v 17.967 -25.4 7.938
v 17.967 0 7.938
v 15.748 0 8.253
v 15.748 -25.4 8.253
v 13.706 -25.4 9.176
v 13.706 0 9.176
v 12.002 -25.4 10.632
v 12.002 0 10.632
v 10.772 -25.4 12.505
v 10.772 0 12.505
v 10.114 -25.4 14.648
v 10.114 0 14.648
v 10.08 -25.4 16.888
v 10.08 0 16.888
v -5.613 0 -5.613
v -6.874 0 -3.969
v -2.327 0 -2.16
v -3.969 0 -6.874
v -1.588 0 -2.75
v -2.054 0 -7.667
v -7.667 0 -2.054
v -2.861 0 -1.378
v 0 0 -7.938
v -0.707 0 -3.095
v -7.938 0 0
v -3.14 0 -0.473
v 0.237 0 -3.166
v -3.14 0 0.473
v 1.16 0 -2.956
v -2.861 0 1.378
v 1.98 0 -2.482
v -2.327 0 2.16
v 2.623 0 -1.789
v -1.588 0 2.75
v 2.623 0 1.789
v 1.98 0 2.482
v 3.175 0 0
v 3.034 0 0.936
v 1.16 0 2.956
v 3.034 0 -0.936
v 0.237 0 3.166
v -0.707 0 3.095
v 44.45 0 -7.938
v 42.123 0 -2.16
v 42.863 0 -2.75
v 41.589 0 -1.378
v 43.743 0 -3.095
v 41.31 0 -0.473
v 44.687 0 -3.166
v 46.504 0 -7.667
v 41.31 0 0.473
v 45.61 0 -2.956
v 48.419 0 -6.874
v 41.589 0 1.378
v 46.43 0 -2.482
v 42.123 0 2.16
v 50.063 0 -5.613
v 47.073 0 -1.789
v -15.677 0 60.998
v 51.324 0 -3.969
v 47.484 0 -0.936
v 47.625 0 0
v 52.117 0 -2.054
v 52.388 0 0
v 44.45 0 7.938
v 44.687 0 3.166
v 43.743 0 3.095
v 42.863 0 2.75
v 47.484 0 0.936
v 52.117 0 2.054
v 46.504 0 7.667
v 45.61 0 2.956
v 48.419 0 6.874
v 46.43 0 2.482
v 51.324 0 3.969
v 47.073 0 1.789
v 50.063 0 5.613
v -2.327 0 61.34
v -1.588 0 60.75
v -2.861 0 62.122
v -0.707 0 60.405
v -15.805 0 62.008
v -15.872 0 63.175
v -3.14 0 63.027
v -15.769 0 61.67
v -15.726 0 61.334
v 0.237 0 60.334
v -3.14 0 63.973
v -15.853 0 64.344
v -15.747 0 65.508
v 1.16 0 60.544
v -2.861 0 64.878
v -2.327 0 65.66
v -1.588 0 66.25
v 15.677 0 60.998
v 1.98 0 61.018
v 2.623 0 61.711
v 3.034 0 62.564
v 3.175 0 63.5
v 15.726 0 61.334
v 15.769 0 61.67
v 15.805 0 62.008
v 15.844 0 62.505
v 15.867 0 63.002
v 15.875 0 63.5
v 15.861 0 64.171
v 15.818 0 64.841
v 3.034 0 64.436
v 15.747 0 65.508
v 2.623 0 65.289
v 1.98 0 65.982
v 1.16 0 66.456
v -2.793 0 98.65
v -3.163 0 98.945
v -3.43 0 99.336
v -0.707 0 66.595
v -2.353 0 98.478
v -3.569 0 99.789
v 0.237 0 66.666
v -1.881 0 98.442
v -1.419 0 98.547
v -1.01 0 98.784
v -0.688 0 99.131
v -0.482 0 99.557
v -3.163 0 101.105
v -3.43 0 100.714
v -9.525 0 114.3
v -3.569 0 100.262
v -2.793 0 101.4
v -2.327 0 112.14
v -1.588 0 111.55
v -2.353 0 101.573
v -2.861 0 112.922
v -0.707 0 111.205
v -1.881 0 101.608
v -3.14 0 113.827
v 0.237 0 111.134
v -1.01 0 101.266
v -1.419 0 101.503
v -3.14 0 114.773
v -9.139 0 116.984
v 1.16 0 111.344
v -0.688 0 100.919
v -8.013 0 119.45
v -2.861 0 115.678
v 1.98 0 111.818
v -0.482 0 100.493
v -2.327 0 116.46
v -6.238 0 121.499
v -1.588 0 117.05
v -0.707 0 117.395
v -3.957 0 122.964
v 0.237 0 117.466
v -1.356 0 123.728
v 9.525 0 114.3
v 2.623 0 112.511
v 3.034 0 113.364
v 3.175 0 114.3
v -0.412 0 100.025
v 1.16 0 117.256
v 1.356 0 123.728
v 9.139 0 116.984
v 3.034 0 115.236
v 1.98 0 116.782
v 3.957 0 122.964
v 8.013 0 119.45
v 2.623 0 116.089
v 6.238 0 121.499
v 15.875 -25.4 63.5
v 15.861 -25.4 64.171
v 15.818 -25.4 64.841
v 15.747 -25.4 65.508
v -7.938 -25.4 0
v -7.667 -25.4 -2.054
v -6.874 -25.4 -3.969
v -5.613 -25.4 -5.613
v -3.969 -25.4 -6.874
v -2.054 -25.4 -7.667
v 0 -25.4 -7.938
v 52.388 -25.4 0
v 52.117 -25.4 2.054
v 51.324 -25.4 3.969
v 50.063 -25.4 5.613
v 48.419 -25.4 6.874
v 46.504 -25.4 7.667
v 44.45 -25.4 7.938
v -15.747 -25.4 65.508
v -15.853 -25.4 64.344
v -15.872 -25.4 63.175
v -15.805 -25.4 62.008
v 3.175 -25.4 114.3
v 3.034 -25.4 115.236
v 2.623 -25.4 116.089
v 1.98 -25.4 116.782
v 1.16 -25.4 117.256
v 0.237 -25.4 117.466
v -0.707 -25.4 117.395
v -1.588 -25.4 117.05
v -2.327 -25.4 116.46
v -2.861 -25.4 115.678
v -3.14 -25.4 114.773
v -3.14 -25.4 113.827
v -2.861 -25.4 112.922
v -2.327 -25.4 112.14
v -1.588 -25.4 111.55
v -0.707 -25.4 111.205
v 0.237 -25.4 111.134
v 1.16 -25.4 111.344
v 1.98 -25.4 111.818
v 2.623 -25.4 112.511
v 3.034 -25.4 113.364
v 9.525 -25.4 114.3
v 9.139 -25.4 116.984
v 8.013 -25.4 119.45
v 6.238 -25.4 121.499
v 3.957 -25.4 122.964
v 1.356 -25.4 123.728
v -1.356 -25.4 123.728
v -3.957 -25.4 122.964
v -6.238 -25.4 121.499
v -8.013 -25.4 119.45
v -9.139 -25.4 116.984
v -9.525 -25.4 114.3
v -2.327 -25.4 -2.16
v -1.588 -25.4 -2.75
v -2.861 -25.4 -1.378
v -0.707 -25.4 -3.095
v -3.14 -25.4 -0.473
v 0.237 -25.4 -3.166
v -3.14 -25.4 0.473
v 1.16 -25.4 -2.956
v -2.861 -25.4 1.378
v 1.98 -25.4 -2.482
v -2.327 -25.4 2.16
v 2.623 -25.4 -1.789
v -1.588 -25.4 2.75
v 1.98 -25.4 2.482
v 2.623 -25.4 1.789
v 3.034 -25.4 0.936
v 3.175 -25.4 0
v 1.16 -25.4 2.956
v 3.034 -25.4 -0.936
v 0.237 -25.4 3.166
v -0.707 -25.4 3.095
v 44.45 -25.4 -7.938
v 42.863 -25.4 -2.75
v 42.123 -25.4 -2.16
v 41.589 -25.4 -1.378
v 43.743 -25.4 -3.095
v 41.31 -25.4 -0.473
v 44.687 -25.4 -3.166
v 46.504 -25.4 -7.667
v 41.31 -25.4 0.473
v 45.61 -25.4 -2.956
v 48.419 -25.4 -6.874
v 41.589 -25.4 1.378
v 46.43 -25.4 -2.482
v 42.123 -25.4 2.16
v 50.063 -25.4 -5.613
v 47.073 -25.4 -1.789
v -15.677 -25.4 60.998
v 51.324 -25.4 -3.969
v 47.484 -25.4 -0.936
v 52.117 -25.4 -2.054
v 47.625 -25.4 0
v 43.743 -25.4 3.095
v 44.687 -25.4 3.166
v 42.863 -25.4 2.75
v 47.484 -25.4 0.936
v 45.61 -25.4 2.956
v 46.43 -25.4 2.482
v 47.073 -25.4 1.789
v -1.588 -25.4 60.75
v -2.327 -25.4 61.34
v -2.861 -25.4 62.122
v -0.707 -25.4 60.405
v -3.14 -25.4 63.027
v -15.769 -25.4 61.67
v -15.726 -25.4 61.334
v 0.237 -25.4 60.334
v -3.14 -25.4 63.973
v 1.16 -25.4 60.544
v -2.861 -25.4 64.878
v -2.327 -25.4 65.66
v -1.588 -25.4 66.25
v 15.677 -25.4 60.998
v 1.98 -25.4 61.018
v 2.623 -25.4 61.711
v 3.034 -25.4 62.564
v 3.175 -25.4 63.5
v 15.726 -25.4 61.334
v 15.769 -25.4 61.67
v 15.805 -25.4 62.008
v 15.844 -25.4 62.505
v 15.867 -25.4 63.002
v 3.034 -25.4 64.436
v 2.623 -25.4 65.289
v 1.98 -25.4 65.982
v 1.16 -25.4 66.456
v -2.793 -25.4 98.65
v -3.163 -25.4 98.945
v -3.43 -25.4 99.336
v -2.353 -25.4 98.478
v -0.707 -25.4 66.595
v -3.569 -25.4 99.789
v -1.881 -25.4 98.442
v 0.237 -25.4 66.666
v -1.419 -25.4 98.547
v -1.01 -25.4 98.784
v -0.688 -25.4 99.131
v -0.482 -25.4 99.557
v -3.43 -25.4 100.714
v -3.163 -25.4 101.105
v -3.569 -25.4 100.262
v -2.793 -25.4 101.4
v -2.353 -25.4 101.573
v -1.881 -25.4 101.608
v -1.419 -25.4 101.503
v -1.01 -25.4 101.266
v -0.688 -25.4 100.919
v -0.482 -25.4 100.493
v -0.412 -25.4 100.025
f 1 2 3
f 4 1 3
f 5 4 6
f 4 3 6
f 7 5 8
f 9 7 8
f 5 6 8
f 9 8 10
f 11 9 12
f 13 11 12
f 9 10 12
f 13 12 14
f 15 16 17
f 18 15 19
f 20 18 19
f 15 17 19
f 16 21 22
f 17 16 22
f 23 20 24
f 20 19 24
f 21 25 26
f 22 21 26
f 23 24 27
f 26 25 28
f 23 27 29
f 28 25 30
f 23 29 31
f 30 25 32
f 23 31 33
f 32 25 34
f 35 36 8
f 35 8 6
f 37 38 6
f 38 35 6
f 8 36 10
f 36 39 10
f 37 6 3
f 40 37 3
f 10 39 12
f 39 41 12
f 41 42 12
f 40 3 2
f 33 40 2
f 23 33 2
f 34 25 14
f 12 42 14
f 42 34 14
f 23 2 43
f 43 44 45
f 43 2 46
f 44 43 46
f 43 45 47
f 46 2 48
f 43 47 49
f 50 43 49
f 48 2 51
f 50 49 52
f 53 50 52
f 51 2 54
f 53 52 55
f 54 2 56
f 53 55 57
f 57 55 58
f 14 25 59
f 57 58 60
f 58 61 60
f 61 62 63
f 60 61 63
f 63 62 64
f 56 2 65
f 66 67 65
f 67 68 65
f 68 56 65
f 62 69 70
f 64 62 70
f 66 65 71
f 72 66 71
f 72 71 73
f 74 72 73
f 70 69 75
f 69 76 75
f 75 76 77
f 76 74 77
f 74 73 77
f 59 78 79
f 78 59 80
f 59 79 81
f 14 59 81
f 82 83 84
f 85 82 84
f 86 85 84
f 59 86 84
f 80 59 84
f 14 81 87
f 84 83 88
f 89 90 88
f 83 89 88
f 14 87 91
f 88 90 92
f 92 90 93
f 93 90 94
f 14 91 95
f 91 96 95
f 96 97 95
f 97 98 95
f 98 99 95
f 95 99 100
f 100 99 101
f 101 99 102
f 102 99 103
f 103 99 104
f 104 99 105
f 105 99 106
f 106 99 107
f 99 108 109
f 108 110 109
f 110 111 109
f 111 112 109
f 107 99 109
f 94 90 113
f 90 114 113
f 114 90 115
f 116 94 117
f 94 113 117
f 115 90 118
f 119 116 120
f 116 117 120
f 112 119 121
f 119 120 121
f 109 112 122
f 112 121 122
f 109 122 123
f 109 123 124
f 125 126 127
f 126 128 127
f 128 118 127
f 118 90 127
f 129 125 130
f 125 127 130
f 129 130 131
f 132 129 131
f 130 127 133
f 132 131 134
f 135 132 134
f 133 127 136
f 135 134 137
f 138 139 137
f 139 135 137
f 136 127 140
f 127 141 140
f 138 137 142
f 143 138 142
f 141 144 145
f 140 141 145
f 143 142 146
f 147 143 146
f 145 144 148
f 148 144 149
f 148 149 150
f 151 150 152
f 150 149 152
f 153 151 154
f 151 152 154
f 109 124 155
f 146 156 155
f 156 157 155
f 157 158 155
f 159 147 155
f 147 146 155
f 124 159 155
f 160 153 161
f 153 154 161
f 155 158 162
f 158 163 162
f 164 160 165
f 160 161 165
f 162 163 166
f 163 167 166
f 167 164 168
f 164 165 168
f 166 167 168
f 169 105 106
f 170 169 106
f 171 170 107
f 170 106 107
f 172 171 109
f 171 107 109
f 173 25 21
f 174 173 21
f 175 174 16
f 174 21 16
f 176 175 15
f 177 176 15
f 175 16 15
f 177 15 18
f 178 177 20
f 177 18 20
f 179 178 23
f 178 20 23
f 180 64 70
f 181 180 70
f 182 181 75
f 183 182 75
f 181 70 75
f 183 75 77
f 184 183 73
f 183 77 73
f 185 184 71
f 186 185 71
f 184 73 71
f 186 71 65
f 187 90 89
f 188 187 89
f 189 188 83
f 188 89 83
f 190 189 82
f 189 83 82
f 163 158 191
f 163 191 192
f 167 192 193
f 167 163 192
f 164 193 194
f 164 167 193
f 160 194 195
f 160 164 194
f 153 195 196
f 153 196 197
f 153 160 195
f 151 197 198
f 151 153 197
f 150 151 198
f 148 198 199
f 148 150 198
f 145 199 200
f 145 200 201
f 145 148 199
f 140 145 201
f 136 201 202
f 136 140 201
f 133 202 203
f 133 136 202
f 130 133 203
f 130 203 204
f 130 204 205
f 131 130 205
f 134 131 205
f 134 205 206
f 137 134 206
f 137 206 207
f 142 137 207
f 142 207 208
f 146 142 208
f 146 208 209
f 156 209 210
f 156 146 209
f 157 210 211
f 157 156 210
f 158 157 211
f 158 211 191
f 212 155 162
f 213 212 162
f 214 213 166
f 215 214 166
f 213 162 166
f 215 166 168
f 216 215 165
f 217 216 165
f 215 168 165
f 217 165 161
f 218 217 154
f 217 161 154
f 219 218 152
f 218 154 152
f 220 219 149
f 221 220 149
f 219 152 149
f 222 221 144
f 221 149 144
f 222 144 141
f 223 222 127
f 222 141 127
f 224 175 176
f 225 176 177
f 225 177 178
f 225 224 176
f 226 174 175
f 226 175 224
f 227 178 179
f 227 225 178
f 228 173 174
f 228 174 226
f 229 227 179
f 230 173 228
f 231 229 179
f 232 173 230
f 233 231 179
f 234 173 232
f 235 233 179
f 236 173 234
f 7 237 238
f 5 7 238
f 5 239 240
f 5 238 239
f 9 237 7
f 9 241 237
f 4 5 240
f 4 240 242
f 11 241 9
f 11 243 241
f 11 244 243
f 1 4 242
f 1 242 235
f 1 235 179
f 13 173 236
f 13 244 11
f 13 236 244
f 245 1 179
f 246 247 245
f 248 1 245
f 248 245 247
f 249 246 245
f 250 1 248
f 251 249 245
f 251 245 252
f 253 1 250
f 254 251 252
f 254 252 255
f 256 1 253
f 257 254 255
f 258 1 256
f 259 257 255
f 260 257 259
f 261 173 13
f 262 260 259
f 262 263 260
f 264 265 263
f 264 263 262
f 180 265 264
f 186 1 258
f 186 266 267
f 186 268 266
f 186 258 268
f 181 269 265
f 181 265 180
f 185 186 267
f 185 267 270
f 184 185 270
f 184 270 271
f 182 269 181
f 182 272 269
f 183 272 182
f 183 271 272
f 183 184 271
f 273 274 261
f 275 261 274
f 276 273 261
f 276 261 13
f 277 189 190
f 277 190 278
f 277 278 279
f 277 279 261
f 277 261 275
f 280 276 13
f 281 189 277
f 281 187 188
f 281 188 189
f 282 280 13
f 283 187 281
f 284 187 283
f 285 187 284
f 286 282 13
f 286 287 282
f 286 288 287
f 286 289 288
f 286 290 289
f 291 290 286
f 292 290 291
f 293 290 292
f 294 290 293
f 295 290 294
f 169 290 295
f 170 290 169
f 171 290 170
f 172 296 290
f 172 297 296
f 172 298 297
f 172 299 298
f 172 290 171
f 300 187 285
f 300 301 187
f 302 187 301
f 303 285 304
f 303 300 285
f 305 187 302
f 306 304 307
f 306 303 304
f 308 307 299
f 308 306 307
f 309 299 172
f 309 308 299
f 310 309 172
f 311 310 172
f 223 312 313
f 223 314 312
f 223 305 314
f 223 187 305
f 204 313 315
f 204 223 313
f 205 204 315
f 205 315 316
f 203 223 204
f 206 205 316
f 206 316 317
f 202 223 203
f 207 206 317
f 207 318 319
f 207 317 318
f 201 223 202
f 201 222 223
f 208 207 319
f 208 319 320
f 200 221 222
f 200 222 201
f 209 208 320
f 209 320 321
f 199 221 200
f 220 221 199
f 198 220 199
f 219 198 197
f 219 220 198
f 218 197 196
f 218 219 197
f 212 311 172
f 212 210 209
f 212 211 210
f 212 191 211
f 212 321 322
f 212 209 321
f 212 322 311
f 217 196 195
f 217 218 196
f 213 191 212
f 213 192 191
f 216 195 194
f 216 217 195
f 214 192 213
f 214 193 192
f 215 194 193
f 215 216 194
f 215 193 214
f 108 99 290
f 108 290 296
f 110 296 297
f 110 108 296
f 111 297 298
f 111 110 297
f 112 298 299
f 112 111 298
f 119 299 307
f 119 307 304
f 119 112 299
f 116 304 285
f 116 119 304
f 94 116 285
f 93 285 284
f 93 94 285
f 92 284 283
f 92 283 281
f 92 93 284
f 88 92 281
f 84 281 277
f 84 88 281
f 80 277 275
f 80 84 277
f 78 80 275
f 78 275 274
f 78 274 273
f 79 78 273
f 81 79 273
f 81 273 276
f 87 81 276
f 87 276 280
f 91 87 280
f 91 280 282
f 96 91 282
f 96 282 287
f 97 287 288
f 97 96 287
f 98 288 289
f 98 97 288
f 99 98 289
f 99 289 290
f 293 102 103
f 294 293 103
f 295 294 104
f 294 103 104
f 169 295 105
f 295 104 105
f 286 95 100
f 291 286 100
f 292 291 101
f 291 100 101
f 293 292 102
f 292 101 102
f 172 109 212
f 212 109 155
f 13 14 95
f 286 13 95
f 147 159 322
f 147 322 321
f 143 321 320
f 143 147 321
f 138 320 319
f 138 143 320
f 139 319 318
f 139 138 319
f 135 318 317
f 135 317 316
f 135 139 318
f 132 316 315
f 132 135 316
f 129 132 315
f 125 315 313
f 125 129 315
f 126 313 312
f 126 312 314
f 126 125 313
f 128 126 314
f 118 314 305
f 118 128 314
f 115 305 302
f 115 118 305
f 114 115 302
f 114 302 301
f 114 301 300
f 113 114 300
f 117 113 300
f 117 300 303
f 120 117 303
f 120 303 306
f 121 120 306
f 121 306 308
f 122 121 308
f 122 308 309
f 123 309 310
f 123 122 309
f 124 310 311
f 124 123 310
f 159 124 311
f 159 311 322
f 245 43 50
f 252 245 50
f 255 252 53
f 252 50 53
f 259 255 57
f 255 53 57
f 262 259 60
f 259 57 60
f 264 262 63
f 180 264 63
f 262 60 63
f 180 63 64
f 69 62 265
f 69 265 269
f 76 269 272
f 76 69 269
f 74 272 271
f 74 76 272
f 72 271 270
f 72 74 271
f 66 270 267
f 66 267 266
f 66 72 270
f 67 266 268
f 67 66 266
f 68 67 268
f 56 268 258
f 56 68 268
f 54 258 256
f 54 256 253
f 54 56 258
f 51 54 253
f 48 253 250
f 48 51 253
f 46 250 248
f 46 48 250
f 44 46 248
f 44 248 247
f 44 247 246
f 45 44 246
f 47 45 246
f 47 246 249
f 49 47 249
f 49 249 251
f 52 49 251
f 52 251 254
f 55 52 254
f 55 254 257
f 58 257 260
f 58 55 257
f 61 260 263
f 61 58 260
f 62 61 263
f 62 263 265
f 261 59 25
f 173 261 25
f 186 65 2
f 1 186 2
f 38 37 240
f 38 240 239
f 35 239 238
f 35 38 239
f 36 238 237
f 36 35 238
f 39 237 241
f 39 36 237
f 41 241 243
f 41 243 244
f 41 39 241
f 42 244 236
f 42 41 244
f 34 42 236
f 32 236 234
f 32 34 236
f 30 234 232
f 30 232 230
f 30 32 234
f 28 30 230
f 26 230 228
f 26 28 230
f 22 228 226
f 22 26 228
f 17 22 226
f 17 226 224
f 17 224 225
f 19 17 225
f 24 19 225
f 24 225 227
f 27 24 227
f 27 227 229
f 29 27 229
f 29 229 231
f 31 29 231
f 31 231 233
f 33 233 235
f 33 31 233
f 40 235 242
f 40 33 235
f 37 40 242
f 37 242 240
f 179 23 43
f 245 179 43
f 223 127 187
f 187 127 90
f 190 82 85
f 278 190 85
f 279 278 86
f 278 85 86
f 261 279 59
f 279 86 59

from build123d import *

# Parameters (mm, degrees)
F0_R     = 3.175
F0_R_2   = 1.5875
F1_DEPTH = 25.4


with BuildPart() as f1:
    # F0 (on Front) → F1 (new body)
    with BuildSketch(Plane.XZ):
        with BuildLine():
            ThreePointArc((44.45, -7.9375), (50.06266, -5.61266), (52.3875, 0))
            ThreePointArc((52.3875, 0), (50.06266, 5.61266), (44.45, 7.9375))
            ThreePointArc((44.45, 7.9375), (36.5125, 0), (44.45, -7.9375))
        make_face()
        with Locations((44.45, 0)):
            Circle(F0_R, mode=Mode.SUBTRACT)
        with BuildLine():
            ThreePointArc((44.45, -7.9375), (36.5125, 0), (44.45, 7.9375))
            Line((44.45, 7.9375), (17.967175, 7.9375))
            ThreePointArc((17.967175, 7.9375), (12.002232, 10.631738), (10.080201, 16.888355))
            Line((10.080201, 16.888355), (15.676557, 60.997766))
            ThreePointArc((15.676557, 60.997766), (0, 47.625), (-15.676557, 60.997766))
            Line((-15.676557, 60.997766), (-7.9375, 0))
            ThreePointArc((-7.9375, 0), (0, 7.9375), (7.9375, 0))
            ThreePointArc((7.9375, 0), (5.61266, -5.61266), (0, -7.9375))
            Line((0, -7.9375), (44.45, -7.9375))
        make_face()
        with BuildLine():
            ThreePointArc((-7.9375, 0), (-5.61266, -5.61266), (0, -7.9375))
            ThreePointArc((0, -7.9375), (5.61266, -5.61266), (7.9375, 0))
            ThreePointArc((7.9375, 0), (0, 7.9375), (-7.9375, 0))
        make_face()
        Circle(F0_R, mode=Mode.SUBTRACT)
        with BuildLine():
            Line((15.804738, 62.008062), (15.676557, 60.997766))
            ThreePointArc((15.676557, 60.997766), (15.748751, 61.501886), (15.804738, 62.008062))
        make_face()
        with BuildLine():
            ThreePointArc((-15.676557, 60.997766), (0, 47.625), (15.676557, 60.997766))
            Line((15.676557, 60.997766), (15.804738, 62.008062))
            ThreePointArc((15.804738, 62.008062), (15.857425, 62.753204), (15.875, 63.5))
            ThreePointArc((15.875, 63.5), (15.843082, 64.506168), (15.747457, 65.508289))
            ThreePointArc((15.747457, 65.508289), (0, 79.375), (-15.747457, 65.508289))
            ThreePointArc((-15.747457, 65.508289), (-15.872875, 63.75976), (-15.804738, 62.008062))
            Line((-15.804738, 62.008062), (-15.676557, 60.997766))
        make_face()
        with Locations((0, 63.5)):
            Circle(F0_R, mode=Mode.SUBTRACT)
        with BuildLine():
            ThreePointArc((-15.804738, 62.008062), (-15.748751, 61.501886), (-15.676557, 60.997766))
            Line((-15.676557, 60.997766), (-15.804738, 62.008062))
        make_face()
        with BuildLine():
            Line((-9.525, 114.3), (-15.747457, 65.508289))
            ThreePointArc((-15.747457, 65.508289), (0, 79.375), (15.747457, 65.508289))
            Line((15.747457, 65.508289), (9.525, 114.3))
            ThreePointArc((9.525, 114.3), (0, 104.775), (-9.525, 114.3))
        make_face()
        with Locations((-1.999434, 100.0252)):
            Circle(F0_R_2, mode=Mode.SUBTRACT)
        with BuildLine():
            ThreePointArc((9.525, 114.3), (0, 123.825), (-9.525, 114.3))
            ThreePointArc((-9.525, 114.3), (0, 104.775), (9.525, 114.3))
        make_face()
        with Locations((0, 114.3)):
            Circle(F0_R, mode=Mode.SUBTRACT)
    extrude(amount=F1_DEPTH)


solid = f1.part
